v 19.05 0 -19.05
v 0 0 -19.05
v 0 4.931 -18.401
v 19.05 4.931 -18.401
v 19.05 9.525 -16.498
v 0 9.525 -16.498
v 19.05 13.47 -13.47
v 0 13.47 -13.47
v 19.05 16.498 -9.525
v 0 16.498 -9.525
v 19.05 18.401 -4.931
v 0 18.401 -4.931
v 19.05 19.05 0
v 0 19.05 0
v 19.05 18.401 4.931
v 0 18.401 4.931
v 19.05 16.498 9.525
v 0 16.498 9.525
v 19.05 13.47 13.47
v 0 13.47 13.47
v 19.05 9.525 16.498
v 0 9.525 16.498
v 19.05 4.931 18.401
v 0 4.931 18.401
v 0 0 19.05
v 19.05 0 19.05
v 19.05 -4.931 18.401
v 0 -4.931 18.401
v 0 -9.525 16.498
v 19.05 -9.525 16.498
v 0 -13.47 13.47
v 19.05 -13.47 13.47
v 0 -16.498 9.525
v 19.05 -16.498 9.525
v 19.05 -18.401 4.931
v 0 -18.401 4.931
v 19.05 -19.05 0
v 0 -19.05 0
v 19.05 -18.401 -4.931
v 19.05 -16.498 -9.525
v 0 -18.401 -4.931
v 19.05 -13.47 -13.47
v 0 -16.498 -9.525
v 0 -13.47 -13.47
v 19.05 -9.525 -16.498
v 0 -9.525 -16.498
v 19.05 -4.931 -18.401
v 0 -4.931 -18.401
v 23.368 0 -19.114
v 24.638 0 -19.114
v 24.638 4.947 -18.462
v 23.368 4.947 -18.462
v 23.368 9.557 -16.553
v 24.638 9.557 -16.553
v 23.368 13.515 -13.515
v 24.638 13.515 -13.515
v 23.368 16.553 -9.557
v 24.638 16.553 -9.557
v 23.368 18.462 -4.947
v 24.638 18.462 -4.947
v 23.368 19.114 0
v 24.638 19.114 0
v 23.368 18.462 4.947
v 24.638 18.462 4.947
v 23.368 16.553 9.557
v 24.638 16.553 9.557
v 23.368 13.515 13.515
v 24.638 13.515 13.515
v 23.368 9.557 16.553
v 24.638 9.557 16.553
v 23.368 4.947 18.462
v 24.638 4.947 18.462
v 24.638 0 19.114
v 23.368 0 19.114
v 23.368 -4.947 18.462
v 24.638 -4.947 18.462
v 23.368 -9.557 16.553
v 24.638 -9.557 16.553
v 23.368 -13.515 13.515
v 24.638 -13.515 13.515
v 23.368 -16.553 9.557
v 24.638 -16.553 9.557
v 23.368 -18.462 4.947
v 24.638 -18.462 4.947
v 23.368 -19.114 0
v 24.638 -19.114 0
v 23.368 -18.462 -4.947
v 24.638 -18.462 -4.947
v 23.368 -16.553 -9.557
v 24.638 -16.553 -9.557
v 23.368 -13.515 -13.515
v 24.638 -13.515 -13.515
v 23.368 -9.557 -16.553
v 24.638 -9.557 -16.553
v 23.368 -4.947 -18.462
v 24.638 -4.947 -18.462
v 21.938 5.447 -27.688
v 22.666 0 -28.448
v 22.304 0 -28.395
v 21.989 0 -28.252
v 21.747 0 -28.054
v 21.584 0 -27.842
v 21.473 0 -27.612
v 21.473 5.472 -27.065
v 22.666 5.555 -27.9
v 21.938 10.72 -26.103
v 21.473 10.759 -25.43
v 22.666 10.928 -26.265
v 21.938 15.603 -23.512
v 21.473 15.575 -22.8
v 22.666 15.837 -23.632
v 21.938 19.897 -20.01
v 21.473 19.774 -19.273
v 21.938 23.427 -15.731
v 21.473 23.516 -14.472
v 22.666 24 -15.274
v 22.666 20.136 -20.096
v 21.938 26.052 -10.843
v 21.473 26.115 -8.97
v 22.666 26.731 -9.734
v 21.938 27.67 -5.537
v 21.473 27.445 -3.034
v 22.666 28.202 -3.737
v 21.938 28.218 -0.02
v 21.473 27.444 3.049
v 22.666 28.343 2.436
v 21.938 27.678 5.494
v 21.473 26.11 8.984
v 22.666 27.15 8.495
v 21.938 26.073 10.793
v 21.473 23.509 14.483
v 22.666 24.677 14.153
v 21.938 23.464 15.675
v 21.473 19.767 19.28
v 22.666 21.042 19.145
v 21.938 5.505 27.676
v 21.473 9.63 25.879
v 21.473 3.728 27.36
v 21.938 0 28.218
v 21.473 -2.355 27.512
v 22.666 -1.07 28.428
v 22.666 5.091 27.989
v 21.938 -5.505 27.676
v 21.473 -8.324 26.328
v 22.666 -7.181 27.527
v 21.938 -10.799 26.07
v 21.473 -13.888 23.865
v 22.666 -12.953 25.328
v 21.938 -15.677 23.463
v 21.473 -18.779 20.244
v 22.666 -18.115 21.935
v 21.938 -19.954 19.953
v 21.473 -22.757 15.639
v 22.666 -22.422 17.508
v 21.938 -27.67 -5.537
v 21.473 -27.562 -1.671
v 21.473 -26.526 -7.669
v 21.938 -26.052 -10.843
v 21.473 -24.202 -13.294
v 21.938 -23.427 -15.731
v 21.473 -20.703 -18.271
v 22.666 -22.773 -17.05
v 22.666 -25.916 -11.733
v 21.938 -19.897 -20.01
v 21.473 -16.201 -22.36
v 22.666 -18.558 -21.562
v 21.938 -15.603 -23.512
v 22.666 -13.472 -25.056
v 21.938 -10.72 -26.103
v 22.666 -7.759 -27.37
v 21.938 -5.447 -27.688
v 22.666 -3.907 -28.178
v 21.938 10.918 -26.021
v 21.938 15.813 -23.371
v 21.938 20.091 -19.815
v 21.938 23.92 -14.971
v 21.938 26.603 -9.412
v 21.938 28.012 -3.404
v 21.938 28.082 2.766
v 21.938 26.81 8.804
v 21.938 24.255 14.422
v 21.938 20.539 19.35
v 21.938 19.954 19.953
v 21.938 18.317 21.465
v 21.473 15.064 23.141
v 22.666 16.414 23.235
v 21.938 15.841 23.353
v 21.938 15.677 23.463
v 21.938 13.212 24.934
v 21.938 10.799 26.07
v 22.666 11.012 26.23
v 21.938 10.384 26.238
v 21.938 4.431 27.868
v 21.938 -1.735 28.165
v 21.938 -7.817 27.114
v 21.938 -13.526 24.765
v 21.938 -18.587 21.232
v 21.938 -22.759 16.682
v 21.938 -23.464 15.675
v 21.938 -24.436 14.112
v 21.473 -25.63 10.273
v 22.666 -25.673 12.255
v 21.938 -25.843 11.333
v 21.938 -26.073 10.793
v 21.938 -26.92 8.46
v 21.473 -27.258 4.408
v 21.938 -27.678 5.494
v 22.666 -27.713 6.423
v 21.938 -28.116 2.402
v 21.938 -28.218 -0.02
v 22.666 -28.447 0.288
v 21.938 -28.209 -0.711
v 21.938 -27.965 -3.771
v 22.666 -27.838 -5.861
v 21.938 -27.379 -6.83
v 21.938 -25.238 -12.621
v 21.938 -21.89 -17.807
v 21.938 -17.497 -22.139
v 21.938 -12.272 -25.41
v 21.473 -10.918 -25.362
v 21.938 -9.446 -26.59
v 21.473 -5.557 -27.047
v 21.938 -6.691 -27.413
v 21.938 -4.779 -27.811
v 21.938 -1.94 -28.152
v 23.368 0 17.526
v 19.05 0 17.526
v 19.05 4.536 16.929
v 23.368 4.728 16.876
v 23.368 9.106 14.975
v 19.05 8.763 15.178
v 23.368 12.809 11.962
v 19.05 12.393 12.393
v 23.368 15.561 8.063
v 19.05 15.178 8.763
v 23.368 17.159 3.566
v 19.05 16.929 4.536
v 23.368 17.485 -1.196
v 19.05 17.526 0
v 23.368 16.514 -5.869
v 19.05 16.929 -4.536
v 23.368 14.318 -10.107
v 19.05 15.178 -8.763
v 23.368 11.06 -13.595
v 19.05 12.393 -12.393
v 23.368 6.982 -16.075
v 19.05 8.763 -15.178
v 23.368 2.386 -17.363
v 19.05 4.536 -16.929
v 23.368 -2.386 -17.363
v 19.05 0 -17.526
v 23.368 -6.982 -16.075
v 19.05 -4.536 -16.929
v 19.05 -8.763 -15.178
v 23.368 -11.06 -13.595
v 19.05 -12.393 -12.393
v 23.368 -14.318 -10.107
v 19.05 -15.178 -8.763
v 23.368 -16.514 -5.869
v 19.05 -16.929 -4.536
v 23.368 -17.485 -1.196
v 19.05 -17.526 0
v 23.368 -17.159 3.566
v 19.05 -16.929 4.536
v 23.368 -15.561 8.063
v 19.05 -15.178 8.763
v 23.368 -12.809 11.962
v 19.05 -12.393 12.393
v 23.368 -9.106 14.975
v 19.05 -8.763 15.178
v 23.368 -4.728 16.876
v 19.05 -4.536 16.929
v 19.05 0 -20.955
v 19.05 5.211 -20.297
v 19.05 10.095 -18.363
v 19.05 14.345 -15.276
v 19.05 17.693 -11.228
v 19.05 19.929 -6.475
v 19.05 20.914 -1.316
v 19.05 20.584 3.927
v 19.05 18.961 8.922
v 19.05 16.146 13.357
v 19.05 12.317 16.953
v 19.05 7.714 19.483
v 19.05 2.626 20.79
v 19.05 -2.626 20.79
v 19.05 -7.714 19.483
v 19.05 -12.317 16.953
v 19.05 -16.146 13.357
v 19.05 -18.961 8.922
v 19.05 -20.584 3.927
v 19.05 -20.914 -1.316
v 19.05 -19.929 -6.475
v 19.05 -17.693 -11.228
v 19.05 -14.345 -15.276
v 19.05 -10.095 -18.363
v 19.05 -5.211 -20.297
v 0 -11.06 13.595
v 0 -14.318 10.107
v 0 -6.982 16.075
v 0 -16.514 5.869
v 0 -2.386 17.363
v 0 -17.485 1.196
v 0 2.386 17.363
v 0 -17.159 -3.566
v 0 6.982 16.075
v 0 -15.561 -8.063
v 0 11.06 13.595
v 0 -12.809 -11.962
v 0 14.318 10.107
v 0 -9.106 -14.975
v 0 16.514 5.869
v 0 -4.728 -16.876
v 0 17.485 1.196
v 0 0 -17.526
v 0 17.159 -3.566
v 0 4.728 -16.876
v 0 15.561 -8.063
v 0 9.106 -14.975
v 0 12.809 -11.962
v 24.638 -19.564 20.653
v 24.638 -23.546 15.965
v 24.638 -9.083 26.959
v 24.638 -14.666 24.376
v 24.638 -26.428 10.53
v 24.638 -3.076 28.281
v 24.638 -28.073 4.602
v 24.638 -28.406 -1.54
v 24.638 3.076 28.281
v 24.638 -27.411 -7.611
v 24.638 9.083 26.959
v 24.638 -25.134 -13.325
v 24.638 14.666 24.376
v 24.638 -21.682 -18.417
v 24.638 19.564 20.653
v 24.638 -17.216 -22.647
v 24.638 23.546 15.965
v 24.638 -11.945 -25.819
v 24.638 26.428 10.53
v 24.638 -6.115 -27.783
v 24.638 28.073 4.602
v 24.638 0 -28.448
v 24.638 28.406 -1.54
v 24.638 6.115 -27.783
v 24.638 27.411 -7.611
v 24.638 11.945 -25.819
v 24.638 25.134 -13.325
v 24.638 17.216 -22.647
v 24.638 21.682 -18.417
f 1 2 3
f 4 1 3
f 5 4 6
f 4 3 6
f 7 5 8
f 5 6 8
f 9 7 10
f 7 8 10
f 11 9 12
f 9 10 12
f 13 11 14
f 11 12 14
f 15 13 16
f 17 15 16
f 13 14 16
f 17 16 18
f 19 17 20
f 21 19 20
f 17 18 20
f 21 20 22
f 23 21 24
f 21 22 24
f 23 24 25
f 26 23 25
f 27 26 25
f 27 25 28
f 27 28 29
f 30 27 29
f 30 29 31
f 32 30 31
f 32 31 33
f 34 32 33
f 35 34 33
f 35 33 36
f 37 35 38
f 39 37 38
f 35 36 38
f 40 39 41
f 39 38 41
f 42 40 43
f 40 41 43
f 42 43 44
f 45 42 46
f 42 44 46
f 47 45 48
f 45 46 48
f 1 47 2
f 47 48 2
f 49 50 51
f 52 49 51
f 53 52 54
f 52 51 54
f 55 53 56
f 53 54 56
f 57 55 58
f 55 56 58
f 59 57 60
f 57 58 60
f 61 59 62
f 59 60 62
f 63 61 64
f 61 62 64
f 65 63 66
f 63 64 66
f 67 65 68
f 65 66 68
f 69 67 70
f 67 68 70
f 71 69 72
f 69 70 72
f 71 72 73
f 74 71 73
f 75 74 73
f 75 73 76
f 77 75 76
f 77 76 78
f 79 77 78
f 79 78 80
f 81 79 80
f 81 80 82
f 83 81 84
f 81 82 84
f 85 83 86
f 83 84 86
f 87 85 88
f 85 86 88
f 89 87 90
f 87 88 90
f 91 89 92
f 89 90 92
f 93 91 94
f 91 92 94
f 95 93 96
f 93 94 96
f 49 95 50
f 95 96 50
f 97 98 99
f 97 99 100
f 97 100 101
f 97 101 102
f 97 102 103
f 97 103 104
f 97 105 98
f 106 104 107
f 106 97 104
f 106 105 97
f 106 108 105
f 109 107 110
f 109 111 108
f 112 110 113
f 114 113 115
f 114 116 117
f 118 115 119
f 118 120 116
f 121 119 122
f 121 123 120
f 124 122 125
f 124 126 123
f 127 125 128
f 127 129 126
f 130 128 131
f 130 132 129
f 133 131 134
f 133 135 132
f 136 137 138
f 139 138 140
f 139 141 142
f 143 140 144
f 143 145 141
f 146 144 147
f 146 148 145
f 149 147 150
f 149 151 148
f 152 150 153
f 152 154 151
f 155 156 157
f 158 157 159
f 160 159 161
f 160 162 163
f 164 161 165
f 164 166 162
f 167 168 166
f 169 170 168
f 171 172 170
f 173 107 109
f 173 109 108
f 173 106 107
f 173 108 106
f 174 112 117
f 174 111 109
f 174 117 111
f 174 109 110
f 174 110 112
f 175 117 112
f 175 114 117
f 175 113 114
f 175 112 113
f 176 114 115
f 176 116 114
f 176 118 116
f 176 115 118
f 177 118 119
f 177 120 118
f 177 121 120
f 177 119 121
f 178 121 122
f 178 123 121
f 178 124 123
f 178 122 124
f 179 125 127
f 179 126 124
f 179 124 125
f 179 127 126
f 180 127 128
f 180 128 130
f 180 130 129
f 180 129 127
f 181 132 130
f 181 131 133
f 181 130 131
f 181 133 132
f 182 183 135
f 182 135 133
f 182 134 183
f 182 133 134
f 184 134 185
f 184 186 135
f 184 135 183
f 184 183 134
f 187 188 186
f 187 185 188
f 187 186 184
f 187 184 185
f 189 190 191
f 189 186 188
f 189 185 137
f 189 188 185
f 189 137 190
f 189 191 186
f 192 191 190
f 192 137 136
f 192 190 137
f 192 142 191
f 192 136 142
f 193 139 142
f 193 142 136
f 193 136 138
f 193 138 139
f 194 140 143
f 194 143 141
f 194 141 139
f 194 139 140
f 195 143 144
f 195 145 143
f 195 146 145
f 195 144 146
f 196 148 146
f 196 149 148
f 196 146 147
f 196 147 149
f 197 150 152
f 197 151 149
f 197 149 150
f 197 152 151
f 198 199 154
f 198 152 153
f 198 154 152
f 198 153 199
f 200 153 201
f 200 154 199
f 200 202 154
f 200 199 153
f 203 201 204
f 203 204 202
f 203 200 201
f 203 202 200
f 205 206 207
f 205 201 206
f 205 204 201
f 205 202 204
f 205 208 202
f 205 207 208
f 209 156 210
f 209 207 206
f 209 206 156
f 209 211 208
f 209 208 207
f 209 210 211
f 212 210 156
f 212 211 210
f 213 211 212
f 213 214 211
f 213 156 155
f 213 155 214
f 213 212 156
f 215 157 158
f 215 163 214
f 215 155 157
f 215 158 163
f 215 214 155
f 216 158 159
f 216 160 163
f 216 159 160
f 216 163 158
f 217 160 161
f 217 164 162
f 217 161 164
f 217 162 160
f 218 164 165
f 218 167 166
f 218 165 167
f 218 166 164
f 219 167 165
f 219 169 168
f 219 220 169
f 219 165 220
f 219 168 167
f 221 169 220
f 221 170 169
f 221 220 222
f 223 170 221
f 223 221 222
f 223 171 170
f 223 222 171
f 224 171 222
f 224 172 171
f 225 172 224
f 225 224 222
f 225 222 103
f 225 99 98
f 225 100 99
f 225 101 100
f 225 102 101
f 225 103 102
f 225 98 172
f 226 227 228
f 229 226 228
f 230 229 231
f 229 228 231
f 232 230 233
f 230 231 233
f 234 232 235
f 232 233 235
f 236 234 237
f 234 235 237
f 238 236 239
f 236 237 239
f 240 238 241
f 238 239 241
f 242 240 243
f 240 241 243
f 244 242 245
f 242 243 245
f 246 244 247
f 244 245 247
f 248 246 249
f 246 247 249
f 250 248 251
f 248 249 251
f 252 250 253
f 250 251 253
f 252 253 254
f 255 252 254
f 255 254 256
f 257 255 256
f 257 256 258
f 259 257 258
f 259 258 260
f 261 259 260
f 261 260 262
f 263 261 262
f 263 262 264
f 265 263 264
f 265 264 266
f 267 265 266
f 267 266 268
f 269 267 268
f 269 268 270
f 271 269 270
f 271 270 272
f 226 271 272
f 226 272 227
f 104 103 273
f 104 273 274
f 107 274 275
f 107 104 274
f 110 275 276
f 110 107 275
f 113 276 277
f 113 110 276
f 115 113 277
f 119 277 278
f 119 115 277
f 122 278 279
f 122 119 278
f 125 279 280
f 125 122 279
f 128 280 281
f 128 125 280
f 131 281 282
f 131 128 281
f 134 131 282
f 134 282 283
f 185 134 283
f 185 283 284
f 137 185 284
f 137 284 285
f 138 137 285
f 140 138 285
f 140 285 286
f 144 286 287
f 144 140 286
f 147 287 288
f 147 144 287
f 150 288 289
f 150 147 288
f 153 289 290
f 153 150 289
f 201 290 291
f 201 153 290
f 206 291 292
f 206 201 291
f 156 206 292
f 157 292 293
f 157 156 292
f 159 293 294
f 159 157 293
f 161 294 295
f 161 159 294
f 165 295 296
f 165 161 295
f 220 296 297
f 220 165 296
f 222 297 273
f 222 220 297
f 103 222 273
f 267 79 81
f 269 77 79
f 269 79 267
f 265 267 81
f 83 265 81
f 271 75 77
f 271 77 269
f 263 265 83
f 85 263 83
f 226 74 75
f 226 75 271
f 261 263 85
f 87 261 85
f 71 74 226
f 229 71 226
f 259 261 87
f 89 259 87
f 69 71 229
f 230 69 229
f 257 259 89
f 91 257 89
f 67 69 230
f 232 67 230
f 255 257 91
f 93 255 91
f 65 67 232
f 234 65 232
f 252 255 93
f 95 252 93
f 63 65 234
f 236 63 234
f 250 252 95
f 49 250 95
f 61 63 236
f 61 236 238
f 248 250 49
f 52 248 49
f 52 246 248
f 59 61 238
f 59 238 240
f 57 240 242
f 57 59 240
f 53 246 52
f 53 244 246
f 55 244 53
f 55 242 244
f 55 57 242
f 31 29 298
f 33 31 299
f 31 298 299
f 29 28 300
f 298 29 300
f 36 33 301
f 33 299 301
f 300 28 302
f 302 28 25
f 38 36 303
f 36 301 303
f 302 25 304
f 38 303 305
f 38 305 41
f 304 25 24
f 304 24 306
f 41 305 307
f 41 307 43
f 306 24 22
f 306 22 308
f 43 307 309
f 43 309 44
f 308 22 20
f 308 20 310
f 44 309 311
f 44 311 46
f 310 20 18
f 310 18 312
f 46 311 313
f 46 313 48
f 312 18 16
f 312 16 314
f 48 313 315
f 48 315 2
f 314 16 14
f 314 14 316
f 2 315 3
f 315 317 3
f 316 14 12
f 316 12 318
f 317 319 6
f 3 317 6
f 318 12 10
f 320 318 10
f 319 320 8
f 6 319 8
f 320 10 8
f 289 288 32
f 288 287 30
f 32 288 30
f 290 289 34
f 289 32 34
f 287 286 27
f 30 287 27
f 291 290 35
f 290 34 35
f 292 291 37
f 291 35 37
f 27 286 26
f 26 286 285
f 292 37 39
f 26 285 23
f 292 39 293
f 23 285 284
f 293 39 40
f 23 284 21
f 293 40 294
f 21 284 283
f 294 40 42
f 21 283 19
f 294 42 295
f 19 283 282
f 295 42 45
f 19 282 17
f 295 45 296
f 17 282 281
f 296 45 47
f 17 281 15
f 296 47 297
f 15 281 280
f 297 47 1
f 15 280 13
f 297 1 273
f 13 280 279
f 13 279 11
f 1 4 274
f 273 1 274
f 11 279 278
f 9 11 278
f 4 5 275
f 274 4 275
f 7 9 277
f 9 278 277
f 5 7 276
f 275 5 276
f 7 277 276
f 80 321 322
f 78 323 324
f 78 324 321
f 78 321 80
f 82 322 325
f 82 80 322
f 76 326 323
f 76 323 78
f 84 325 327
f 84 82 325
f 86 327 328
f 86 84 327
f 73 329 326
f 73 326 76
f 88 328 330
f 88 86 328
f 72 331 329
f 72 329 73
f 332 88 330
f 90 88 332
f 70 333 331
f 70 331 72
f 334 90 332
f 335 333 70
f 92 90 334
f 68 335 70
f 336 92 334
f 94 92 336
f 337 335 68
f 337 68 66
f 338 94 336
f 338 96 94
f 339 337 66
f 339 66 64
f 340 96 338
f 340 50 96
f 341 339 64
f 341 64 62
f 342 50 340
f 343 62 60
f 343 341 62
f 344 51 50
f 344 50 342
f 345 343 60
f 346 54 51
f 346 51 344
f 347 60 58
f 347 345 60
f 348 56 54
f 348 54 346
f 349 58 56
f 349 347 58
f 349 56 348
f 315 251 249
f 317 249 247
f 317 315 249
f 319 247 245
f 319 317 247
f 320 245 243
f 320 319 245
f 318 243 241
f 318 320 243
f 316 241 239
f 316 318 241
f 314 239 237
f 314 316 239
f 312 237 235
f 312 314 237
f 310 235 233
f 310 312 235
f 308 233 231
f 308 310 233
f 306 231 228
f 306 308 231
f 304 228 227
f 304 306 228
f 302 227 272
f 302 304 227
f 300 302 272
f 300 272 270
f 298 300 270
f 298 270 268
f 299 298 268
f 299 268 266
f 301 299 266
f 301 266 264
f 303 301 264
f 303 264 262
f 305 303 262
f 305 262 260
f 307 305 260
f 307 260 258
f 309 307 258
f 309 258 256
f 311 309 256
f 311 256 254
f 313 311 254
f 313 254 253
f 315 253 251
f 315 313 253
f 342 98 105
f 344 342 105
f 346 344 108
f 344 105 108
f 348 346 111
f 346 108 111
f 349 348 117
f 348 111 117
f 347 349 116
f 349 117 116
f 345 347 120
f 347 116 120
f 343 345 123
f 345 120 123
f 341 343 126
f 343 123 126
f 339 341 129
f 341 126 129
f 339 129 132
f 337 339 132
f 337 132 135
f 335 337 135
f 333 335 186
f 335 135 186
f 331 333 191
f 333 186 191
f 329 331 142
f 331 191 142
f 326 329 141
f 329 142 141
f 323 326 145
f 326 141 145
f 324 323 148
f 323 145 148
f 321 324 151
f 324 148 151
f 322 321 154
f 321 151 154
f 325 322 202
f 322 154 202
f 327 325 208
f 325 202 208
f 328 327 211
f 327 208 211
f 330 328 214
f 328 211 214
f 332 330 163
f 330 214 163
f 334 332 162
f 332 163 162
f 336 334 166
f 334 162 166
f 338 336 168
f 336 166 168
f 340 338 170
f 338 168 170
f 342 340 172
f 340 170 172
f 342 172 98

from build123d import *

# Parameters (mm, degrees)
SKETCH1_R           = 19.05
SKETCH1_R_2         = 17.526
BOSS_EXTRUDE1_DEPTH = 19.05
SKETCH2_R           = 28.448
BOSS_EXTRUDE2_DEPTH = 5.588
CHAMFER1_SIZE       = 7.493
CHAMFER1_SIZE2      = 2.727228965
FILLET2_R           = 1.27
SKETCH3_R           = 17.526
CUT_EXTRUDE1_DEPTH  = 6.5880001
SKETCH4_R           = 19.1135
SKETCH4_R_2         = 17.526
CUT_EXTRUDE2_DEPTH  = 1.27


with BuildPart() as part:
    # Sketch1 → Boss-Extrude1 (new body)
    with BuildSketch(Plane(origin=(0, 0, 0), x_dir=(0, 0, -1), z_dir=(1, 0, 0))):
        Circle(SKETCH1_R)
        Circle(SKETCH1_R_2, mode=Mode.SUBTRACT)
    extrude(amount=BOSS_EXTRUDE1_DEPTH)

    # Sketch2 → Boss-Extrude2 (add)
    with BuildSketch(Plane(origin=(19.05, 0, 0), x_dir=(0, 0, -1), z_dir=(1, 0, 0))):
        Circle(SKETCH2_R)
    extrude(amount=BOSS_EXTRUDE2_DEPTH)

    # Chamfer1
    chamfer1_edges = [part.edges().sort_by_distance(p)[0] for p in [
        (19.05, 0, 28.448),
    ]]
    chamfer1_side = [part.faces().sort_by_distance(p)[0] for p in [
        (19.05, 0, 27.643369052),
    ]]
    chamfer(chamfer1_edges, length=CHAMFER1_SIZE, length2=CHAMFER1_SIZE2, reference=chamfer1_side[0])

    # Fillet2
    fillet2_edges = [part.edges().sort_by_distance(p)[0] for p in [
        (21.777228965, 0, 28.448),
    ]]
    fillet(fillet2_edges, radius=FILLET2_R)

    # Sketch3 → Cut-Extrude1 (cut, through all)
    with BuildSketch(Plane.ZY.offset(-19.05)):
        Circle(SKETCH3_R)
    extrude(amount=-CUT_EXTRUDE1_DEPTH, mode=Mode.SUBTRACT)

    # Sketch4 → Cut-Extrude2 (cut)
    with BuildSketch(Plane(origin=(24.638, 0, 0), x_dir=(0, 0, -1), z_dir=(1, 0, 0))):
        Circle(SKETCH4_R)
        Circle(SKETCH4_R_2, mode=Mode.SUBTRACT)
    extrude(amount=-CUT_EXTRUDE2_DEPTH, mode=Mode.SUBTRACT)


solid = part.part
